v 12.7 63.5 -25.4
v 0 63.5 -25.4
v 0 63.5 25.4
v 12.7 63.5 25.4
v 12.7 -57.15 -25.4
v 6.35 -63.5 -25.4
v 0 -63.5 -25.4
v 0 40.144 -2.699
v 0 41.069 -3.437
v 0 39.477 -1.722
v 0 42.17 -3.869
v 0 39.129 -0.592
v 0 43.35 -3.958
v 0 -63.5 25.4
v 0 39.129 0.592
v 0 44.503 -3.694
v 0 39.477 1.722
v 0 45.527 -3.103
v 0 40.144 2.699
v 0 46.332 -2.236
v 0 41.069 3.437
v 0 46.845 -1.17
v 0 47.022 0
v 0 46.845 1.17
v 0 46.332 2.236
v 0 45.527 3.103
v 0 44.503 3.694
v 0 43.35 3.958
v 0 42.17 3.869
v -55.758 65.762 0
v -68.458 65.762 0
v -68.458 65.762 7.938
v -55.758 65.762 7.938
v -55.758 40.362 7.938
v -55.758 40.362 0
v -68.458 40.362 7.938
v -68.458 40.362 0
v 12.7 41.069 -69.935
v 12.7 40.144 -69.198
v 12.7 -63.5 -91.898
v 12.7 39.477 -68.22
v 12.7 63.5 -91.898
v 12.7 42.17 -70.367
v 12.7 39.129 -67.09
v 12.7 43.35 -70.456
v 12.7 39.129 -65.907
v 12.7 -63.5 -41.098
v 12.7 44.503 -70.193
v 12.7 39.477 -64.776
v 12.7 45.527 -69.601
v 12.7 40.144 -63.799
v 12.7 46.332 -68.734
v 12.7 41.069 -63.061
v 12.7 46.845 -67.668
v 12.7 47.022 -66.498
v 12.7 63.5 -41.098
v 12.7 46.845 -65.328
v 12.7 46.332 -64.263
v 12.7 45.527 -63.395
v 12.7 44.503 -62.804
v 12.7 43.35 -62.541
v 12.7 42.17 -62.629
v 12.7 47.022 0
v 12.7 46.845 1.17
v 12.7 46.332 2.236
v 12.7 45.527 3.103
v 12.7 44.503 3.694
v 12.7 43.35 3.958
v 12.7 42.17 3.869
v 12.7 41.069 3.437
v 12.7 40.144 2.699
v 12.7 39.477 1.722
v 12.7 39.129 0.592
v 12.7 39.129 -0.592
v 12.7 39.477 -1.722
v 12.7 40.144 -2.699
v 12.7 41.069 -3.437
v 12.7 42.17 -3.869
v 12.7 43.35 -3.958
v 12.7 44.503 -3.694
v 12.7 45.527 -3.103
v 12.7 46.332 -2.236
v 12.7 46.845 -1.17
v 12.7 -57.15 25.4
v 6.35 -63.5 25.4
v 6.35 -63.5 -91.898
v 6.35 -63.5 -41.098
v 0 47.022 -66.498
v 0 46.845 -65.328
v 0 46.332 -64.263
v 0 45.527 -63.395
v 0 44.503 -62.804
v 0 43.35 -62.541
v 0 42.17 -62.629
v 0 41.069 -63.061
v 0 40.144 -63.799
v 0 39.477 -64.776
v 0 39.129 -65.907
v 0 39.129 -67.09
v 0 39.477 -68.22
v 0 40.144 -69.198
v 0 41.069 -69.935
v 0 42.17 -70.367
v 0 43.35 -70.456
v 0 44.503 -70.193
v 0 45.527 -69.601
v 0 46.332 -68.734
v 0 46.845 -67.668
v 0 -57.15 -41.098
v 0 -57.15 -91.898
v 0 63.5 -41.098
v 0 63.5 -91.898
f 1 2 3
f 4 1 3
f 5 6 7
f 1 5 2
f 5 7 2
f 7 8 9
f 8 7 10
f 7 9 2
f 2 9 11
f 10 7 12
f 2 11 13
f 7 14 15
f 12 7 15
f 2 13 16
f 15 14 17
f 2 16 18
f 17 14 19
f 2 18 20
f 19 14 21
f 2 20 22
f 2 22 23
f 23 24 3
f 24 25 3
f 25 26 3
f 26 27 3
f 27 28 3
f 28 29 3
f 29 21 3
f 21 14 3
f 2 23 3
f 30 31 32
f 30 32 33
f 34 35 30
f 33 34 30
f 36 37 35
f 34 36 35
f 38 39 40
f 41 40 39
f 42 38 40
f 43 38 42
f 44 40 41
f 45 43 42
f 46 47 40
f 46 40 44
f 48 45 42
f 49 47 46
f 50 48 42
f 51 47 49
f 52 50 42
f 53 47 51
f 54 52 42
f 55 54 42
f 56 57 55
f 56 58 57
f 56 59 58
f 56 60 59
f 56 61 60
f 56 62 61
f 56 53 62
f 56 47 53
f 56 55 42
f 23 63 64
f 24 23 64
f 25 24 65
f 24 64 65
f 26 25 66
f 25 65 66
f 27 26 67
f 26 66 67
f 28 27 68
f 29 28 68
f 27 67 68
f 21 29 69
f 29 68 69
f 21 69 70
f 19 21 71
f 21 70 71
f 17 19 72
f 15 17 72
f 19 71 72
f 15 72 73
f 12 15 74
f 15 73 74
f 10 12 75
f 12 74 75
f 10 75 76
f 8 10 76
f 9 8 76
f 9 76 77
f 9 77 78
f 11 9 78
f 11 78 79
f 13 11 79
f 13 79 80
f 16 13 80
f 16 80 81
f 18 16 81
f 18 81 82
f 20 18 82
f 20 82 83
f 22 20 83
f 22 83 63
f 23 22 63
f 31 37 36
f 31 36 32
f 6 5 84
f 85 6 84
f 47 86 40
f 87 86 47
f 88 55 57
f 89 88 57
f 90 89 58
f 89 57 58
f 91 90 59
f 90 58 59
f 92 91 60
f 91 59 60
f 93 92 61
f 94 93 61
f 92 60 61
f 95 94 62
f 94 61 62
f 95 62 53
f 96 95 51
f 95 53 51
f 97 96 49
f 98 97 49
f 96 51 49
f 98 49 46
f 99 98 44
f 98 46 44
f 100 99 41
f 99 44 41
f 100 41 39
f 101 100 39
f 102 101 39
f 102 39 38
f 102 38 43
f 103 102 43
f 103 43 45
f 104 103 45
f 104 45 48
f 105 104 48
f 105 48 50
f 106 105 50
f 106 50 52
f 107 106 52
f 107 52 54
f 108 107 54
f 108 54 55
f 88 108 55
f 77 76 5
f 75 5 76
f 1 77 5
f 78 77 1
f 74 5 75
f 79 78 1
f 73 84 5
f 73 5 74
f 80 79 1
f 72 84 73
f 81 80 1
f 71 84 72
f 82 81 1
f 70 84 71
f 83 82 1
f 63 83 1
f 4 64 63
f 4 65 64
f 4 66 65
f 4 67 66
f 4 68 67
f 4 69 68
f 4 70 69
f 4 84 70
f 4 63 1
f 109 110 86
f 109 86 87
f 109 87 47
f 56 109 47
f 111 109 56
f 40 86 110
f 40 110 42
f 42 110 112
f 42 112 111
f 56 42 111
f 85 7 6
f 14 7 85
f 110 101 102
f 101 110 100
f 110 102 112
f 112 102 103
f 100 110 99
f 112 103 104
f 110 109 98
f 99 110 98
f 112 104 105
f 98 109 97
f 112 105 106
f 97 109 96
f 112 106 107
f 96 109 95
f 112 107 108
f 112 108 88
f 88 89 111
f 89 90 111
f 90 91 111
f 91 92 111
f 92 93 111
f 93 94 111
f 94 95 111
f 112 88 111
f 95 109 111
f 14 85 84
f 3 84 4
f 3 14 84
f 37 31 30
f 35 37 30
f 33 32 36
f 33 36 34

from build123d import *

# Parameters (mm, degrees)
F0_W      = 127
F0_H      = 50.8
F1_DEPTH  = 12.7
F2_SIZE   = 6.35
F3_W      = 127
F3_H      = 50.8
F4_DEPTH  = 12.7
F5_SIZE   = 6.35
F6_R      = 3.96875
F7_DEPTH  = 12.701
F8_R      = 3.96875
F9_DEPTH  = 12.701
F10_W     = 12.7
F10_H     = 25.4
F11_DEPTH = 7.9375


with BuildPart() as f1:
    # F0 (on Right) → F1 (new body)
    with BuildSketch(Plane.YZ):
        Rectangle(F0_W, F0_H)
    extrude(amount=F1_DEPTH)

    # F2
    f2_edges = [f1.edges().sort_by_distance(p)[0] for p in [
        (12.7, -63.5, 0),
    ]]
    chamfer(f2_edges, length=F2_SIZE)

    # F6 (on face) → F7 (cut, through all)
    with BuildSketch(Plane.YZ.offset(12.7)):
        with Locations((43.053, 0)):
            Circle(F6_R)
    extrude(amount=-F7_DEPTH, mode=Mode.SUBTRACT)


with BuildPart() as f4:
    # F3 (on Right) → F4 (new body)
    with BuildSketch(Plane.YZ):
        with Locations((0, -66.498213)):
            Rectangle(F3_W, F3_H)
    extrude(amount=F4_DEPTH)

    # F5
    f5_edges = [f4.edges().sort_by_distance(p)[0] for p in [
        (0, -63.5, -66.498213),
    ]]
    chamfer(f5_edges, length=F5_SIZE)

    # F8 (on face) → F9 (cut, through all)
    with BuildSketch(Plane.YZ.offset(12.7)):
        with Locations((43.053, -66.498213)):
            Circle(F8_R)
    extrude(amount=-F9_DEPTH, mode=Mode.SUBTRACT)


with BuildPart() as f11:
    # F10 (on Top) → F11 (new body)
    with BuildSketch(Plane.XY):
        with Locations((-62.107756, 53.061553)):
            Rectangle(F10_W, F10_H)
    extrude(amount=F11_DEPTH)


solid = Compound([f1.part, f4.part, f11.part])
